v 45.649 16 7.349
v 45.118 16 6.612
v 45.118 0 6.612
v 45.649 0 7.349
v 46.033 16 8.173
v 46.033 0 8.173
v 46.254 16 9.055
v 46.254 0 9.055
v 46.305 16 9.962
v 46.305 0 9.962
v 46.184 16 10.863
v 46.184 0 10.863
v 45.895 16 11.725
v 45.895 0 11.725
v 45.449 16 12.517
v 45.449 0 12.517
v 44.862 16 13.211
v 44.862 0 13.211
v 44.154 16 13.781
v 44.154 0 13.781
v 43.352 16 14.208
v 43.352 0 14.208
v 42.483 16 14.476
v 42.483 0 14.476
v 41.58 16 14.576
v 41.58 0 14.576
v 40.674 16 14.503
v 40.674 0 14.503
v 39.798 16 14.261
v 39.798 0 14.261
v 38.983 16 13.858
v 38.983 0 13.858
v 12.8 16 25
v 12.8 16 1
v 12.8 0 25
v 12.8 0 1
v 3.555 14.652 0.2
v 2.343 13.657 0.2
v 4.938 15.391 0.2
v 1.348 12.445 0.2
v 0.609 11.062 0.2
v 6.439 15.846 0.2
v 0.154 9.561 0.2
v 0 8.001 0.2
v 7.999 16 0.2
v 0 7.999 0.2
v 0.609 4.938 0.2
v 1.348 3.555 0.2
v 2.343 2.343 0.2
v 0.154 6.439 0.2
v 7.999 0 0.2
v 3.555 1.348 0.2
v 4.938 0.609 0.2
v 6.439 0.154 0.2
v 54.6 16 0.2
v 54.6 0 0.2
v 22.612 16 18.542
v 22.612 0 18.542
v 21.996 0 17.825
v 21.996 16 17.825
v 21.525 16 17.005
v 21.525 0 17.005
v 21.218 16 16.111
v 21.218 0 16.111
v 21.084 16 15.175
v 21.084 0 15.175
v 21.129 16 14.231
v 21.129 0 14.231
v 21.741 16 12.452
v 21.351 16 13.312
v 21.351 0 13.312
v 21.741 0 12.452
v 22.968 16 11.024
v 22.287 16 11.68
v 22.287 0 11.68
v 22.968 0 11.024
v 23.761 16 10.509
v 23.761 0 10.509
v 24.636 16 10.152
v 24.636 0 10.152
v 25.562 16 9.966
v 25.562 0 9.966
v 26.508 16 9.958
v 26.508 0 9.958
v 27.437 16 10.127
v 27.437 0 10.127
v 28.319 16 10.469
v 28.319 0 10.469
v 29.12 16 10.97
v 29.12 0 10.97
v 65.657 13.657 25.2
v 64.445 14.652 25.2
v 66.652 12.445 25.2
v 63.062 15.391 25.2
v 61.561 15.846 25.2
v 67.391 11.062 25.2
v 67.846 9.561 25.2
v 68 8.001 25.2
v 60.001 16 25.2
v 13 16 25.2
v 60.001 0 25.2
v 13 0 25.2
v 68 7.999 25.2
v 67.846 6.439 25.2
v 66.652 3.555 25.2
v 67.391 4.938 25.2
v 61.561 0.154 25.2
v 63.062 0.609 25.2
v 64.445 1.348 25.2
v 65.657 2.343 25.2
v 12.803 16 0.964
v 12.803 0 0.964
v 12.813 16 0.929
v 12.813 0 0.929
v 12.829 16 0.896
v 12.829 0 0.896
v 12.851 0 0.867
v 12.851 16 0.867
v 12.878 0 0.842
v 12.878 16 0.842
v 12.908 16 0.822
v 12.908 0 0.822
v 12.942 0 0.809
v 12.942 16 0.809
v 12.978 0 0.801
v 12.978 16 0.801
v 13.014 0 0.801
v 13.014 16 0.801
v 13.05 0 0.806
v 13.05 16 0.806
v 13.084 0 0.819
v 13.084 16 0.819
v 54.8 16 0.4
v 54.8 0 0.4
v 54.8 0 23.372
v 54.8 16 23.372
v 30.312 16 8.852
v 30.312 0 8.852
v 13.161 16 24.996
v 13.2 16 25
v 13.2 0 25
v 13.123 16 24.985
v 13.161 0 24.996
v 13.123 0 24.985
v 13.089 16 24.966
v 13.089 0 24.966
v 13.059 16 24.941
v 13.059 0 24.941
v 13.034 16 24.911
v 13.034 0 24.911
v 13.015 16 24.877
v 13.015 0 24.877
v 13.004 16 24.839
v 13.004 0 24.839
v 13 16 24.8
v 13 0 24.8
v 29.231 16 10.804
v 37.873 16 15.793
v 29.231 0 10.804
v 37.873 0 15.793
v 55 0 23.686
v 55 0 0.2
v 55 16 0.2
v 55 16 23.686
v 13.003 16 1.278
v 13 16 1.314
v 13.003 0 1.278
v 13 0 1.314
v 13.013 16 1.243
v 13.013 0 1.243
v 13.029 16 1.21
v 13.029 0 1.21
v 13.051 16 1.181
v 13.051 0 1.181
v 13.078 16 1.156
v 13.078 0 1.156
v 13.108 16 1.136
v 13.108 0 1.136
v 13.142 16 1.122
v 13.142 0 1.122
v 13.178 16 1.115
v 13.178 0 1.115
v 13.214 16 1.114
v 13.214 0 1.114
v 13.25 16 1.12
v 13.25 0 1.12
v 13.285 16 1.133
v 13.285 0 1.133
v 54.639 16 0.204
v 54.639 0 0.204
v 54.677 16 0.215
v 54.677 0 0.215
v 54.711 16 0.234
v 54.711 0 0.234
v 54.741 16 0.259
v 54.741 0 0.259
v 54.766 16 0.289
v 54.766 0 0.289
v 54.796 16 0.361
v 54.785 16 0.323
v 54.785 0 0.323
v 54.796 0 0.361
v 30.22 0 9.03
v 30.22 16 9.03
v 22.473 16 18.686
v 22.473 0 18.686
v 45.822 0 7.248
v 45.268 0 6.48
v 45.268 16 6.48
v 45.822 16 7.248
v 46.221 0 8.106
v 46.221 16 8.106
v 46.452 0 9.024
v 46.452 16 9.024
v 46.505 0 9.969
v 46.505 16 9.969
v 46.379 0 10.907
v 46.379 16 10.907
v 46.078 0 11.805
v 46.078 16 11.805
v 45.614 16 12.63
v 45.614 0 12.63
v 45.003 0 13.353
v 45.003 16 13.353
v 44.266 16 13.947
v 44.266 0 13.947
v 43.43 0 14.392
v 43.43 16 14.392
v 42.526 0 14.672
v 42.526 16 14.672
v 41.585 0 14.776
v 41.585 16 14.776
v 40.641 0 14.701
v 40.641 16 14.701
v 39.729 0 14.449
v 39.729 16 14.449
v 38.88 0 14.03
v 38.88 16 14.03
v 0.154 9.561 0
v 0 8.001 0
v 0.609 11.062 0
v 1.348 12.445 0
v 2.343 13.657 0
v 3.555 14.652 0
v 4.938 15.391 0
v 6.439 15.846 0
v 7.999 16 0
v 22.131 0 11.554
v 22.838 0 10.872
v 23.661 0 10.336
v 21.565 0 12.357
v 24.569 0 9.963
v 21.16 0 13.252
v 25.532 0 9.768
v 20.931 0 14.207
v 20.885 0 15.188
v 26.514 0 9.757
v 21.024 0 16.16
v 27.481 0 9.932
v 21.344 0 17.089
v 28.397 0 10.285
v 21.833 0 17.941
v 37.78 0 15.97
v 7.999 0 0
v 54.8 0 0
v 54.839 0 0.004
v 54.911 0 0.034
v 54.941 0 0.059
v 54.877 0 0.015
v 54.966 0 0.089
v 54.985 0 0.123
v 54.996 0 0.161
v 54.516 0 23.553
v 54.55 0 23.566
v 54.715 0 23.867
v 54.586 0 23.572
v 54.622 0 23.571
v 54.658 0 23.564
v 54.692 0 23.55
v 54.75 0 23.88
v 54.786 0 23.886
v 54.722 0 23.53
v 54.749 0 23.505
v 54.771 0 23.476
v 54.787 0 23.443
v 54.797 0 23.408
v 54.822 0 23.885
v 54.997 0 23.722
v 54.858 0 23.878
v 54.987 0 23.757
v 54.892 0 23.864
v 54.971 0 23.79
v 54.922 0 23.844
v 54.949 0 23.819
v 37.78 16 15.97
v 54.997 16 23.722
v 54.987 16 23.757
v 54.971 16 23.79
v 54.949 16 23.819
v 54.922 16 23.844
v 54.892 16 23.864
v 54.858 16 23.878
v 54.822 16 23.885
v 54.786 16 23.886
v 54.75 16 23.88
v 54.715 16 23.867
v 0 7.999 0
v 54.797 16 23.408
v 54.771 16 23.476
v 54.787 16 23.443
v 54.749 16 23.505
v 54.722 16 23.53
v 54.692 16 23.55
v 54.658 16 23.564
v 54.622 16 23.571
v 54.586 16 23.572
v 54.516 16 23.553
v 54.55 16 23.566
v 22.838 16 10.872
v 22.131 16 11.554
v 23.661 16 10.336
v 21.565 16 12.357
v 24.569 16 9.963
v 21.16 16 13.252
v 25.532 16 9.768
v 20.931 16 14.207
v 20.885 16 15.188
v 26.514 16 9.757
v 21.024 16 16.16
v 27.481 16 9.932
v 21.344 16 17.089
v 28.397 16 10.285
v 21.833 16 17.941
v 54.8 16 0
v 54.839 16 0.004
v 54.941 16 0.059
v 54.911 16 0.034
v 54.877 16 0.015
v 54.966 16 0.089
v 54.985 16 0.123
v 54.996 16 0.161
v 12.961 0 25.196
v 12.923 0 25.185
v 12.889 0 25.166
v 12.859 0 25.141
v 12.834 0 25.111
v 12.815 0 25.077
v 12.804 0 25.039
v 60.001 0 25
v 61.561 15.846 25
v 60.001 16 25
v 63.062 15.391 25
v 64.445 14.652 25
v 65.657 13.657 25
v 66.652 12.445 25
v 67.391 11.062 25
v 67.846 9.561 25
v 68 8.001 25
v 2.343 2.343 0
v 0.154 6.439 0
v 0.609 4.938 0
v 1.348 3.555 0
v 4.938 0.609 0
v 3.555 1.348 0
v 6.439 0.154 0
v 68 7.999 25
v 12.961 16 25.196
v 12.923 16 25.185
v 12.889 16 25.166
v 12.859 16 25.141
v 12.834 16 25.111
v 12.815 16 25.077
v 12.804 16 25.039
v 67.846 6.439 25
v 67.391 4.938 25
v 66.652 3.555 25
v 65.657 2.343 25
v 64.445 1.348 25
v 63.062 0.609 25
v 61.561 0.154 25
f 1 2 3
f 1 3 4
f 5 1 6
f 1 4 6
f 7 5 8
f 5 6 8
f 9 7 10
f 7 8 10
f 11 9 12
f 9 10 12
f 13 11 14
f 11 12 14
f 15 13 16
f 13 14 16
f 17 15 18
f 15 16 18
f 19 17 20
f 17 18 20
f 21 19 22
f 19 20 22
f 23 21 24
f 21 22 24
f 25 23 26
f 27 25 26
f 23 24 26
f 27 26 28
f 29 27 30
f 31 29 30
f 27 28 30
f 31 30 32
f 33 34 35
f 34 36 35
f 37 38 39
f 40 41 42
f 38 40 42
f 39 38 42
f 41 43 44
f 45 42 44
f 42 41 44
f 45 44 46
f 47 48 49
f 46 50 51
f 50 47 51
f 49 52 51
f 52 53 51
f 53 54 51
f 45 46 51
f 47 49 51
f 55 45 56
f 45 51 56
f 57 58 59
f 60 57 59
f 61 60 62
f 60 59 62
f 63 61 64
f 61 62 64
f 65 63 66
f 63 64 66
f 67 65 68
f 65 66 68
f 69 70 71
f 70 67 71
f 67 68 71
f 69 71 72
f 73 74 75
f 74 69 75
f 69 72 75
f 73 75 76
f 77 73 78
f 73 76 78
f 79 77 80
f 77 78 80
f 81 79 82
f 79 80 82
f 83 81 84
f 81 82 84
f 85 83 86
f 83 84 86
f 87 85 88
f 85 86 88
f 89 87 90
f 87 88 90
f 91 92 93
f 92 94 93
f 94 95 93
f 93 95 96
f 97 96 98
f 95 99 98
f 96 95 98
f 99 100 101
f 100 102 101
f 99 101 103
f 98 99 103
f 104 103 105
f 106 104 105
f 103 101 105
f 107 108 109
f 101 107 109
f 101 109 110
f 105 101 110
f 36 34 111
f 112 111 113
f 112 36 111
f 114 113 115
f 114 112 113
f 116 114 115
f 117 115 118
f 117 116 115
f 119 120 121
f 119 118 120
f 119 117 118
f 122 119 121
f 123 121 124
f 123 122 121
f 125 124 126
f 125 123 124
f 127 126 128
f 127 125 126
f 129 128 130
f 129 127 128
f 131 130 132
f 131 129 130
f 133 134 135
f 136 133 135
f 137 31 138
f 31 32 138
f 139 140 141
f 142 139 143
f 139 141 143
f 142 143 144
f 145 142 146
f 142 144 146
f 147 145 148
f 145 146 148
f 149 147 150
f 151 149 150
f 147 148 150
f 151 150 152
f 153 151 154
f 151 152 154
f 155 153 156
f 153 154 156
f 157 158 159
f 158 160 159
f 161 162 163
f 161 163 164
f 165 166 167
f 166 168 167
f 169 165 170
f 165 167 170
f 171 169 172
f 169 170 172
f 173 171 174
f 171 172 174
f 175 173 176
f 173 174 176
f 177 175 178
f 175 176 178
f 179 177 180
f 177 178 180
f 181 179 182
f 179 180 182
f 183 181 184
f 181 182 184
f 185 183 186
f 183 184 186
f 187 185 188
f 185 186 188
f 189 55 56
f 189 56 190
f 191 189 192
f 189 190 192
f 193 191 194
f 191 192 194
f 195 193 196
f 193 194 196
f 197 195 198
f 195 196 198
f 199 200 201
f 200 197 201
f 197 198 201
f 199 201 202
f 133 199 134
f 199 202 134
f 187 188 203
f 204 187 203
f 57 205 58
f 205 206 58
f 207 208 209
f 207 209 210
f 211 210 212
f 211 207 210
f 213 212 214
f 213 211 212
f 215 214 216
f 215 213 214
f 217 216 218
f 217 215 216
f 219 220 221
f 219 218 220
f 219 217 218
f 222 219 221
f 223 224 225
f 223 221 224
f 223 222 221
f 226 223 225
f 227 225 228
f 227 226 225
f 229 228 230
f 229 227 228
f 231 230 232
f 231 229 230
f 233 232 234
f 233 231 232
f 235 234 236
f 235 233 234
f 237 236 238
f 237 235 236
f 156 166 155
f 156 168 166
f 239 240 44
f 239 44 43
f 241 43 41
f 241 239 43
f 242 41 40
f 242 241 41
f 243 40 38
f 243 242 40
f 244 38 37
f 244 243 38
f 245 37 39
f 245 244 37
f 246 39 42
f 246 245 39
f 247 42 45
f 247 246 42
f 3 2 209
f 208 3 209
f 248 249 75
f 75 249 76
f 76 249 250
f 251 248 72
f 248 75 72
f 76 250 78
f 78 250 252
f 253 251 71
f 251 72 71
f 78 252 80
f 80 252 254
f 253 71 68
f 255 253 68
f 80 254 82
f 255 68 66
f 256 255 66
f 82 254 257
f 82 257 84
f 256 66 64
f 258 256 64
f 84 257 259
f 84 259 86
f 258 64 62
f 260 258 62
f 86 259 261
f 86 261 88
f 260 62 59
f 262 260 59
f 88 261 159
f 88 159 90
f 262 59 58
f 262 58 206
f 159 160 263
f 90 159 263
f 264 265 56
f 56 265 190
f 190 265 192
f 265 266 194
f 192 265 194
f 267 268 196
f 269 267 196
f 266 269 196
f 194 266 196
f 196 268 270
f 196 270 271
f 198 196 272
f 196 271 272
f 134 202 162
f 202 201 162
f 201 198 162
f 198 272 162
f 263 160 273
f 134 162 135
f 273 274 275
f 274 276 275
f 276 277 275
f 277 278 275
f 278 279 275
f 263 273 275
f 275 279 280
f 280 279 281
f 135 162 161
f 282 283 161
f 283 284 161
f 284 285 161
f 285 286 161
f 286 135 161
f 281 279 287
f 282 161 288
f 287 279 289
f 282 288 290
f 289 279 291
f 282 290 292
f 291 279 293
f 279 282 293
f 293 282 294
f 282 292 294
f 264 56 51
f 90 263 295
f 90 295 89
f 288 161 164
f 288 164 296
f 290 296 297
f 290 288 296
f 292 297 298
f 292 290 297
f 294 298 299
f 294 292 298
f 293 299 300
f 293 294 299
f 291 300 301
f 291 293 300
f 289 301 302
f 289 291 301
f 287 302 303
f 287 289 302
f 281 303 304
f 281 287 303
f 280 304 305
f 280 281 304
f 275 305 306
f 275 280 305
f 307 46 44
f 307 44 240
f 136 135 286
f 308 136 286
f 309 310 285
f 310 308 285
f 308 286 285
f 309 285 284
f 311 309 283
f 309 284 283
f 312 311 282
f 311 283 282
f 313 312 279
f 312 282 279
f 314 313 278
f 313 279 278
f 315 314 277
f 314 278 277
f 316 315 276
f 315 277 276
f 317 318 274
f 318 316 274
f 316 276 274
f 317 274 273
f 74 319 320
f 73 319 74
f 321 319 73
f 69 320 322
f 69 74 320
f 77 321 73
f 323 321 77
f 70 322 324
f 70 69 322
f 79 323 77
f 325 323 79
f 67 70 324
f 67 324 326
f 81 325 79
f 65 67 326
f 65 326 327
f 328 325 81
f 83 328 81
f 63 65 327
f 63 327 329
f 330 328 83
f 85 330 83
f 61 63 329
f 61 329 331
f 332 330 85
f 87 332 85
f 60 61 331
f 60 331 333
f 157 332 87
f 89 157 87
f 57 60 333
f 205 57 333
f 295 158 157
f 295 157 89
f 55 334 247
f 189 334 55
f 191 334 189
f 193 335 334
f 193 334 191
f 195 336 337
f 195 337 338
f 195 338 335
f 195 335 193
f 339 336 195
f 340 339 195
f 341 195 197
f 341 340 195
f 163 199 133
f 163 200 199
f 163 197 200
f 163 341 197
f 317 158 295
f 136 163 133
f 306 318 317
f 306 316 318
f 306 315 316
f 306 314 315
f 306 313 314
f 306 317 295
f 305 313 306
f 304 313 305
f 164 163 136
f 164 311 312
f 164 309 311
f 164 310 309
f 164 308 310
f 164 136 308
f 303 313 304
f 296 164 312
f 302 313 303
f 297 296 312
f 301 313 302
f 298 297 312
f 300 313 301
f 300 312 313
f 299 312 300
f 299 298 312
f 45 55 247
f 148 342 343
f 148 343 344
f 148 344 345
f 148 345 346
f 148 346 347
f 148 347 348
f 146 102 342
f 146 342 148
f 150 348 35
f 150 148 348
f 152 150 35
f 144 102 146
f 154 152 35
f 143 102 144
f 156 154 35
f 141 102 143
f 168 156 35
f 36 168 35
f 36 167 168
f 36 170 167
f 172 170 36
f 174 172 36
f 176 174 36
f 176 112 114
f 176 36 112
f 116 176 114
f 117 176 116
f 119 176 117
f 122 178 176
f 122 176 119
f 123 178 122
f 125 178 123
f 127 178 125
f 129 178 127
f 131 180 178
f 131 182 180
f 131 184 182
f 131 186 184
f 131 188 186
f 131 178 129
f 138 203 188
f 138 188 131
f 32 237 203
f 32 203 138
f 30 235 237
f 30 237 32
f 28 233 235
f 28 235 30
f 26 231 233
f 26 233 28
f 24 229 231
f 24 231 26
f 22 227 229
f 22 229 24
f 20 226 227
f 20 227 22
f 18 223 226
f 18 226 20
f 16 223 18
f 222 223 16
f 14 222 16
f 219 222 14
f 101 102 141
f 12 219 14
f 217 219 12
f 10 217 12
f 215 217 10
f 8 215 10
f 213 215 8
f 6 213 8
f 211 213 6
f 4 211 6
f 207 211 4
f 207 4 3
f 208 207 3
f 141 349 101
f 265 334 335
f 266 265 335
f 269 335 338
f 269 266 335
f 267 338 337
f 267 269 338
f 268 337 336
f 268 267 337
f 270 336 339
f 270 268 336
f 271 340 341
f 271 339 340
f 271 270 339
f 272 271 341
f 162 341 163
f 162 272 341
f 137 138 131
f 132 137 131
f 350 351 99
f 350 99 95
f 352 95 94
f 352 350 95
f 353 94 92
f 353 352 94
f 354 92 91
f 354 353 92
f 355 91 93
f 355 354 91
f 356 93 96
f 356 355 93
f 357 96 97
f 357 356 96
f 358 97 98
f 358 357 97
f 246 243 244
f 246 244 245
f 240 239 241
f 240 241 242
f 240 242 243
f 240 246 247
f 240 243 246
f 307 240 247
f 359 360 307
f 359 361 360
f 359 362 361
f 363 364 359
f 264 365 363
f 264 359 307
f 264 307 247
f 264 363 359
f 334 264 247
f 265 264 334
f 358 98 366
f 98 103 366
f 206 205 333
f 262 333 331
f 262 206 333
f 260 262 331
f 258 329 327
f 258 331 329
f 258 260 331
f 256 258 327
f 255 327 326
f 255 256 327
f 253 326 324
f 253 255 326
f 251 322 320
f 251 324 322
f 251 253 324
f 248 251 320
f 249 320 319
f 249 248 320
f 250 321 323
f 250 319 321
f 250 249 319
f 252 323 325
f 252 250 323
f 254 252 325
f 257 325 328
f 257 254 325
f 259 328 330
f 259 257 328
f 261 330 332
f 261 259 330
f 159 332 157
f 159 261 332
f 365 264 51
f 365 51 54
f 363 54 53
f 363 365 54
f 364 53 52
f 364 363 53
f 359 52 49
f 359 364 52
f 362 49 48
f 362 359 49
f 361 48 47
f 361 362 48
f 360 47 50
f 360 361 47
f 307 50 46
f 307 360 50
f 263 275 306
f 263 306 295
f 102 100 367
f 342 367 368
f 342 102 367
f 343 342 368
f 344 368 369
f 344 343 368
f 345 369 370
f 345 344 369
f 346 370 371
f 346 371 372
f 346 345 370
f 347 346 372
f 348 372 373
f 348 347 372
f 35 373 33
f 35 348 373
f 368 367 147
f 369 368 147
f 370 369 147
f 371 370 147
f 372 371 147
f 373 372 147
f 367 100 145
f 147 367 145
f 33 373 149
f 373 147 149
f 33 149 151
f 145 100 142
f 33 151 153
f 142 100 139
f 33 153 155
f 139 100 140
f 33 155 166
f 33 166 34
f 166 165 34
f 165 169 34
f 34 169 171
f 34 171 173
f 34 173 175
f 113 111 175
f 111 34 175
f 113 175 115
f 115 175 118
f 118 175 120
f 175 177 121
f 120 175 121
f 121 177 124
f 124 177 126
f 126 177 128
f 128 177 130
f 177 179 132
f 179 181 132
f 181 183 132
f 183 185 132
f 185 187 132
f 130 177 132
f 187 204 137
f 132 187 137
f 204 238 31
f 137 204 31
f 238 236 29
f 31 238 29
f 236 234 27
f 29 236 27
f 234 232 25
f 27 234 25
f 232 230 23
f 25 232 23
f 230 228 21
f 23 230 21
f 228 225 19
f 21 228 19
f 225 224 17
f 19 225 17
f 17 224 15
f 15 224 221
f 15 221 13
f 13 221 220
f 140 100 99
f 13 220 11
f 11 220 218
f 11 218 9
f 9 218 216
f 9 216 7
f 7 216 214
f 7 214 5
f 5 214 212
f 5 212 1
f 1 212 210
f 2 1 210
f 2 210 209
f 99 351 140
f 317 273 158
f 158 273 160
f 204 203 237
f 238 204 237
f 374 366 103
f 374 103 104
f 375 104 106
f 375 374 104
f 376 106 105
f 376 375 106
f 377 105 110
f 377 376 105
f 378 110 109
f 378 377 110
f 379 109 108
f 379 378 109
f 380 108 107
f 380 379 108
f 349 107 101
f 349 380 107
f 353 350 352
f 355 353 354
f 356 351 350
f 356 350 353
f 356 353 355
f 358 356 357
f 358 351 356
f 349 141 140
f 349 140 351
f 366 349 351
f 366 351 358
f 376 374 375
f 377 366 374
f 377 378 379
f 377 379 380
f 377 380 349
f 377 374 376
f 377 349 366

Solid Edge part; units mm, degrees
sketch "Sketch1" plane through (0, 0, 0) normal (0, -1, 0) x (1, 0, 0)
  line L0 (13, 1.3139) -> (13, 24.8)
  arc A0 (13.2, 25) -> (13, 24.8) centre (13.2, 24.8) ccw
  line L1 (13.2, 25) -> (68, 25)
  line L2 (68, 25.2) -> (68, 25)
  line L3 (13, 25.2) -> (68, 25.2)
  arc A1 (13, 25.2) -> (12.8, 25) centre (13, 25) ccw
  line L4 (12.8, 1) -> (12.8, 25)
  arc A2 (13.0845, 0.8187) -> (12.8, 1) centre (13, 1) cw
  line L5 (30.3123, 8.8522) -> (13.0845, 0.8187)
  line L6 (38.9827, 13.8581) -> (30.3123, 8.8522)
  arc A3 (45.1175, 6.6117) -> (38.9827, 13.8581) centre (41.5085, 9.7763) ccw
  line L7 (45.1175, 6.6117) -> (45.2679, 6.4799)
  arc A4 (38.8801, 14.0297) -> (45.2679, 6.4799) centre (41.5085, 9.7763) cw
  line L8 (30.2198, 9.0297) -> (38.8801, 14.0297)
  line L9 (13.2845, 1.1327) -> (30.2198, 9.0297)
  arc A5 (13, 1.3139) -> (13.2845, 1.1327) centre (13.2, 1.3139) ccw
  arc A6 (55, 0.2) -> (54.8, 0) centre (54.8, 0.2) cw
  line L10 (0, 0) -> (54.8, 0)
  line L11 (0, 0.2) -> (0, 0)
  line L12 (0, 0.2) -> (54.6, 0.2)
  arc A7 (54.8, 0.4) -> (54.6, 0.2) centre (54.6, 0.4) cw
  line L13 (54.8, 0.4) -> (54.8, 23.3721)
  arc A8 (54.5155, 23.5534) -> (54.8, 23.3721) centre (54.6, 23.3721) cw
  line L14 (54.5155, 23.5534) -> (37.8726, 15.7927)
  line L15 (37.8726, 15.7927) -> (29.2311, 10.8035)
  arc A9 (29.2311, 10.8035) -> (22.4729, 18.6858) centre (26.0788, 14.9391) cw
  line L16 (22.4729, 18.6858) -> (22.6116, 18.5417)
  arc A10 (29.1199, 10.9703) -> (22.6116, 18.5417) centre (26.0788, 14.9391) cw
  line L17 (37.7802, 15.9703) -> (29.1199, 10.9703)
  line L18 (54.7155, 23.8673) -> (37.7802, 15.9703)
  arc A11 (54.7155, 23.8673) -> (55, 23.6861) centre (54.8, 23.6861) cw
  line L19 (55, 0.2) -> (55, 23.6861)
extrude "Protrusion1" add sketch "Sketch1" against normal blind 16
fillet "Round_3" radius 8 4 edges at (68, 0, 25.1) (68, 16, 25.1) (0, 0, 0.1) (0, 16, 0.1)
